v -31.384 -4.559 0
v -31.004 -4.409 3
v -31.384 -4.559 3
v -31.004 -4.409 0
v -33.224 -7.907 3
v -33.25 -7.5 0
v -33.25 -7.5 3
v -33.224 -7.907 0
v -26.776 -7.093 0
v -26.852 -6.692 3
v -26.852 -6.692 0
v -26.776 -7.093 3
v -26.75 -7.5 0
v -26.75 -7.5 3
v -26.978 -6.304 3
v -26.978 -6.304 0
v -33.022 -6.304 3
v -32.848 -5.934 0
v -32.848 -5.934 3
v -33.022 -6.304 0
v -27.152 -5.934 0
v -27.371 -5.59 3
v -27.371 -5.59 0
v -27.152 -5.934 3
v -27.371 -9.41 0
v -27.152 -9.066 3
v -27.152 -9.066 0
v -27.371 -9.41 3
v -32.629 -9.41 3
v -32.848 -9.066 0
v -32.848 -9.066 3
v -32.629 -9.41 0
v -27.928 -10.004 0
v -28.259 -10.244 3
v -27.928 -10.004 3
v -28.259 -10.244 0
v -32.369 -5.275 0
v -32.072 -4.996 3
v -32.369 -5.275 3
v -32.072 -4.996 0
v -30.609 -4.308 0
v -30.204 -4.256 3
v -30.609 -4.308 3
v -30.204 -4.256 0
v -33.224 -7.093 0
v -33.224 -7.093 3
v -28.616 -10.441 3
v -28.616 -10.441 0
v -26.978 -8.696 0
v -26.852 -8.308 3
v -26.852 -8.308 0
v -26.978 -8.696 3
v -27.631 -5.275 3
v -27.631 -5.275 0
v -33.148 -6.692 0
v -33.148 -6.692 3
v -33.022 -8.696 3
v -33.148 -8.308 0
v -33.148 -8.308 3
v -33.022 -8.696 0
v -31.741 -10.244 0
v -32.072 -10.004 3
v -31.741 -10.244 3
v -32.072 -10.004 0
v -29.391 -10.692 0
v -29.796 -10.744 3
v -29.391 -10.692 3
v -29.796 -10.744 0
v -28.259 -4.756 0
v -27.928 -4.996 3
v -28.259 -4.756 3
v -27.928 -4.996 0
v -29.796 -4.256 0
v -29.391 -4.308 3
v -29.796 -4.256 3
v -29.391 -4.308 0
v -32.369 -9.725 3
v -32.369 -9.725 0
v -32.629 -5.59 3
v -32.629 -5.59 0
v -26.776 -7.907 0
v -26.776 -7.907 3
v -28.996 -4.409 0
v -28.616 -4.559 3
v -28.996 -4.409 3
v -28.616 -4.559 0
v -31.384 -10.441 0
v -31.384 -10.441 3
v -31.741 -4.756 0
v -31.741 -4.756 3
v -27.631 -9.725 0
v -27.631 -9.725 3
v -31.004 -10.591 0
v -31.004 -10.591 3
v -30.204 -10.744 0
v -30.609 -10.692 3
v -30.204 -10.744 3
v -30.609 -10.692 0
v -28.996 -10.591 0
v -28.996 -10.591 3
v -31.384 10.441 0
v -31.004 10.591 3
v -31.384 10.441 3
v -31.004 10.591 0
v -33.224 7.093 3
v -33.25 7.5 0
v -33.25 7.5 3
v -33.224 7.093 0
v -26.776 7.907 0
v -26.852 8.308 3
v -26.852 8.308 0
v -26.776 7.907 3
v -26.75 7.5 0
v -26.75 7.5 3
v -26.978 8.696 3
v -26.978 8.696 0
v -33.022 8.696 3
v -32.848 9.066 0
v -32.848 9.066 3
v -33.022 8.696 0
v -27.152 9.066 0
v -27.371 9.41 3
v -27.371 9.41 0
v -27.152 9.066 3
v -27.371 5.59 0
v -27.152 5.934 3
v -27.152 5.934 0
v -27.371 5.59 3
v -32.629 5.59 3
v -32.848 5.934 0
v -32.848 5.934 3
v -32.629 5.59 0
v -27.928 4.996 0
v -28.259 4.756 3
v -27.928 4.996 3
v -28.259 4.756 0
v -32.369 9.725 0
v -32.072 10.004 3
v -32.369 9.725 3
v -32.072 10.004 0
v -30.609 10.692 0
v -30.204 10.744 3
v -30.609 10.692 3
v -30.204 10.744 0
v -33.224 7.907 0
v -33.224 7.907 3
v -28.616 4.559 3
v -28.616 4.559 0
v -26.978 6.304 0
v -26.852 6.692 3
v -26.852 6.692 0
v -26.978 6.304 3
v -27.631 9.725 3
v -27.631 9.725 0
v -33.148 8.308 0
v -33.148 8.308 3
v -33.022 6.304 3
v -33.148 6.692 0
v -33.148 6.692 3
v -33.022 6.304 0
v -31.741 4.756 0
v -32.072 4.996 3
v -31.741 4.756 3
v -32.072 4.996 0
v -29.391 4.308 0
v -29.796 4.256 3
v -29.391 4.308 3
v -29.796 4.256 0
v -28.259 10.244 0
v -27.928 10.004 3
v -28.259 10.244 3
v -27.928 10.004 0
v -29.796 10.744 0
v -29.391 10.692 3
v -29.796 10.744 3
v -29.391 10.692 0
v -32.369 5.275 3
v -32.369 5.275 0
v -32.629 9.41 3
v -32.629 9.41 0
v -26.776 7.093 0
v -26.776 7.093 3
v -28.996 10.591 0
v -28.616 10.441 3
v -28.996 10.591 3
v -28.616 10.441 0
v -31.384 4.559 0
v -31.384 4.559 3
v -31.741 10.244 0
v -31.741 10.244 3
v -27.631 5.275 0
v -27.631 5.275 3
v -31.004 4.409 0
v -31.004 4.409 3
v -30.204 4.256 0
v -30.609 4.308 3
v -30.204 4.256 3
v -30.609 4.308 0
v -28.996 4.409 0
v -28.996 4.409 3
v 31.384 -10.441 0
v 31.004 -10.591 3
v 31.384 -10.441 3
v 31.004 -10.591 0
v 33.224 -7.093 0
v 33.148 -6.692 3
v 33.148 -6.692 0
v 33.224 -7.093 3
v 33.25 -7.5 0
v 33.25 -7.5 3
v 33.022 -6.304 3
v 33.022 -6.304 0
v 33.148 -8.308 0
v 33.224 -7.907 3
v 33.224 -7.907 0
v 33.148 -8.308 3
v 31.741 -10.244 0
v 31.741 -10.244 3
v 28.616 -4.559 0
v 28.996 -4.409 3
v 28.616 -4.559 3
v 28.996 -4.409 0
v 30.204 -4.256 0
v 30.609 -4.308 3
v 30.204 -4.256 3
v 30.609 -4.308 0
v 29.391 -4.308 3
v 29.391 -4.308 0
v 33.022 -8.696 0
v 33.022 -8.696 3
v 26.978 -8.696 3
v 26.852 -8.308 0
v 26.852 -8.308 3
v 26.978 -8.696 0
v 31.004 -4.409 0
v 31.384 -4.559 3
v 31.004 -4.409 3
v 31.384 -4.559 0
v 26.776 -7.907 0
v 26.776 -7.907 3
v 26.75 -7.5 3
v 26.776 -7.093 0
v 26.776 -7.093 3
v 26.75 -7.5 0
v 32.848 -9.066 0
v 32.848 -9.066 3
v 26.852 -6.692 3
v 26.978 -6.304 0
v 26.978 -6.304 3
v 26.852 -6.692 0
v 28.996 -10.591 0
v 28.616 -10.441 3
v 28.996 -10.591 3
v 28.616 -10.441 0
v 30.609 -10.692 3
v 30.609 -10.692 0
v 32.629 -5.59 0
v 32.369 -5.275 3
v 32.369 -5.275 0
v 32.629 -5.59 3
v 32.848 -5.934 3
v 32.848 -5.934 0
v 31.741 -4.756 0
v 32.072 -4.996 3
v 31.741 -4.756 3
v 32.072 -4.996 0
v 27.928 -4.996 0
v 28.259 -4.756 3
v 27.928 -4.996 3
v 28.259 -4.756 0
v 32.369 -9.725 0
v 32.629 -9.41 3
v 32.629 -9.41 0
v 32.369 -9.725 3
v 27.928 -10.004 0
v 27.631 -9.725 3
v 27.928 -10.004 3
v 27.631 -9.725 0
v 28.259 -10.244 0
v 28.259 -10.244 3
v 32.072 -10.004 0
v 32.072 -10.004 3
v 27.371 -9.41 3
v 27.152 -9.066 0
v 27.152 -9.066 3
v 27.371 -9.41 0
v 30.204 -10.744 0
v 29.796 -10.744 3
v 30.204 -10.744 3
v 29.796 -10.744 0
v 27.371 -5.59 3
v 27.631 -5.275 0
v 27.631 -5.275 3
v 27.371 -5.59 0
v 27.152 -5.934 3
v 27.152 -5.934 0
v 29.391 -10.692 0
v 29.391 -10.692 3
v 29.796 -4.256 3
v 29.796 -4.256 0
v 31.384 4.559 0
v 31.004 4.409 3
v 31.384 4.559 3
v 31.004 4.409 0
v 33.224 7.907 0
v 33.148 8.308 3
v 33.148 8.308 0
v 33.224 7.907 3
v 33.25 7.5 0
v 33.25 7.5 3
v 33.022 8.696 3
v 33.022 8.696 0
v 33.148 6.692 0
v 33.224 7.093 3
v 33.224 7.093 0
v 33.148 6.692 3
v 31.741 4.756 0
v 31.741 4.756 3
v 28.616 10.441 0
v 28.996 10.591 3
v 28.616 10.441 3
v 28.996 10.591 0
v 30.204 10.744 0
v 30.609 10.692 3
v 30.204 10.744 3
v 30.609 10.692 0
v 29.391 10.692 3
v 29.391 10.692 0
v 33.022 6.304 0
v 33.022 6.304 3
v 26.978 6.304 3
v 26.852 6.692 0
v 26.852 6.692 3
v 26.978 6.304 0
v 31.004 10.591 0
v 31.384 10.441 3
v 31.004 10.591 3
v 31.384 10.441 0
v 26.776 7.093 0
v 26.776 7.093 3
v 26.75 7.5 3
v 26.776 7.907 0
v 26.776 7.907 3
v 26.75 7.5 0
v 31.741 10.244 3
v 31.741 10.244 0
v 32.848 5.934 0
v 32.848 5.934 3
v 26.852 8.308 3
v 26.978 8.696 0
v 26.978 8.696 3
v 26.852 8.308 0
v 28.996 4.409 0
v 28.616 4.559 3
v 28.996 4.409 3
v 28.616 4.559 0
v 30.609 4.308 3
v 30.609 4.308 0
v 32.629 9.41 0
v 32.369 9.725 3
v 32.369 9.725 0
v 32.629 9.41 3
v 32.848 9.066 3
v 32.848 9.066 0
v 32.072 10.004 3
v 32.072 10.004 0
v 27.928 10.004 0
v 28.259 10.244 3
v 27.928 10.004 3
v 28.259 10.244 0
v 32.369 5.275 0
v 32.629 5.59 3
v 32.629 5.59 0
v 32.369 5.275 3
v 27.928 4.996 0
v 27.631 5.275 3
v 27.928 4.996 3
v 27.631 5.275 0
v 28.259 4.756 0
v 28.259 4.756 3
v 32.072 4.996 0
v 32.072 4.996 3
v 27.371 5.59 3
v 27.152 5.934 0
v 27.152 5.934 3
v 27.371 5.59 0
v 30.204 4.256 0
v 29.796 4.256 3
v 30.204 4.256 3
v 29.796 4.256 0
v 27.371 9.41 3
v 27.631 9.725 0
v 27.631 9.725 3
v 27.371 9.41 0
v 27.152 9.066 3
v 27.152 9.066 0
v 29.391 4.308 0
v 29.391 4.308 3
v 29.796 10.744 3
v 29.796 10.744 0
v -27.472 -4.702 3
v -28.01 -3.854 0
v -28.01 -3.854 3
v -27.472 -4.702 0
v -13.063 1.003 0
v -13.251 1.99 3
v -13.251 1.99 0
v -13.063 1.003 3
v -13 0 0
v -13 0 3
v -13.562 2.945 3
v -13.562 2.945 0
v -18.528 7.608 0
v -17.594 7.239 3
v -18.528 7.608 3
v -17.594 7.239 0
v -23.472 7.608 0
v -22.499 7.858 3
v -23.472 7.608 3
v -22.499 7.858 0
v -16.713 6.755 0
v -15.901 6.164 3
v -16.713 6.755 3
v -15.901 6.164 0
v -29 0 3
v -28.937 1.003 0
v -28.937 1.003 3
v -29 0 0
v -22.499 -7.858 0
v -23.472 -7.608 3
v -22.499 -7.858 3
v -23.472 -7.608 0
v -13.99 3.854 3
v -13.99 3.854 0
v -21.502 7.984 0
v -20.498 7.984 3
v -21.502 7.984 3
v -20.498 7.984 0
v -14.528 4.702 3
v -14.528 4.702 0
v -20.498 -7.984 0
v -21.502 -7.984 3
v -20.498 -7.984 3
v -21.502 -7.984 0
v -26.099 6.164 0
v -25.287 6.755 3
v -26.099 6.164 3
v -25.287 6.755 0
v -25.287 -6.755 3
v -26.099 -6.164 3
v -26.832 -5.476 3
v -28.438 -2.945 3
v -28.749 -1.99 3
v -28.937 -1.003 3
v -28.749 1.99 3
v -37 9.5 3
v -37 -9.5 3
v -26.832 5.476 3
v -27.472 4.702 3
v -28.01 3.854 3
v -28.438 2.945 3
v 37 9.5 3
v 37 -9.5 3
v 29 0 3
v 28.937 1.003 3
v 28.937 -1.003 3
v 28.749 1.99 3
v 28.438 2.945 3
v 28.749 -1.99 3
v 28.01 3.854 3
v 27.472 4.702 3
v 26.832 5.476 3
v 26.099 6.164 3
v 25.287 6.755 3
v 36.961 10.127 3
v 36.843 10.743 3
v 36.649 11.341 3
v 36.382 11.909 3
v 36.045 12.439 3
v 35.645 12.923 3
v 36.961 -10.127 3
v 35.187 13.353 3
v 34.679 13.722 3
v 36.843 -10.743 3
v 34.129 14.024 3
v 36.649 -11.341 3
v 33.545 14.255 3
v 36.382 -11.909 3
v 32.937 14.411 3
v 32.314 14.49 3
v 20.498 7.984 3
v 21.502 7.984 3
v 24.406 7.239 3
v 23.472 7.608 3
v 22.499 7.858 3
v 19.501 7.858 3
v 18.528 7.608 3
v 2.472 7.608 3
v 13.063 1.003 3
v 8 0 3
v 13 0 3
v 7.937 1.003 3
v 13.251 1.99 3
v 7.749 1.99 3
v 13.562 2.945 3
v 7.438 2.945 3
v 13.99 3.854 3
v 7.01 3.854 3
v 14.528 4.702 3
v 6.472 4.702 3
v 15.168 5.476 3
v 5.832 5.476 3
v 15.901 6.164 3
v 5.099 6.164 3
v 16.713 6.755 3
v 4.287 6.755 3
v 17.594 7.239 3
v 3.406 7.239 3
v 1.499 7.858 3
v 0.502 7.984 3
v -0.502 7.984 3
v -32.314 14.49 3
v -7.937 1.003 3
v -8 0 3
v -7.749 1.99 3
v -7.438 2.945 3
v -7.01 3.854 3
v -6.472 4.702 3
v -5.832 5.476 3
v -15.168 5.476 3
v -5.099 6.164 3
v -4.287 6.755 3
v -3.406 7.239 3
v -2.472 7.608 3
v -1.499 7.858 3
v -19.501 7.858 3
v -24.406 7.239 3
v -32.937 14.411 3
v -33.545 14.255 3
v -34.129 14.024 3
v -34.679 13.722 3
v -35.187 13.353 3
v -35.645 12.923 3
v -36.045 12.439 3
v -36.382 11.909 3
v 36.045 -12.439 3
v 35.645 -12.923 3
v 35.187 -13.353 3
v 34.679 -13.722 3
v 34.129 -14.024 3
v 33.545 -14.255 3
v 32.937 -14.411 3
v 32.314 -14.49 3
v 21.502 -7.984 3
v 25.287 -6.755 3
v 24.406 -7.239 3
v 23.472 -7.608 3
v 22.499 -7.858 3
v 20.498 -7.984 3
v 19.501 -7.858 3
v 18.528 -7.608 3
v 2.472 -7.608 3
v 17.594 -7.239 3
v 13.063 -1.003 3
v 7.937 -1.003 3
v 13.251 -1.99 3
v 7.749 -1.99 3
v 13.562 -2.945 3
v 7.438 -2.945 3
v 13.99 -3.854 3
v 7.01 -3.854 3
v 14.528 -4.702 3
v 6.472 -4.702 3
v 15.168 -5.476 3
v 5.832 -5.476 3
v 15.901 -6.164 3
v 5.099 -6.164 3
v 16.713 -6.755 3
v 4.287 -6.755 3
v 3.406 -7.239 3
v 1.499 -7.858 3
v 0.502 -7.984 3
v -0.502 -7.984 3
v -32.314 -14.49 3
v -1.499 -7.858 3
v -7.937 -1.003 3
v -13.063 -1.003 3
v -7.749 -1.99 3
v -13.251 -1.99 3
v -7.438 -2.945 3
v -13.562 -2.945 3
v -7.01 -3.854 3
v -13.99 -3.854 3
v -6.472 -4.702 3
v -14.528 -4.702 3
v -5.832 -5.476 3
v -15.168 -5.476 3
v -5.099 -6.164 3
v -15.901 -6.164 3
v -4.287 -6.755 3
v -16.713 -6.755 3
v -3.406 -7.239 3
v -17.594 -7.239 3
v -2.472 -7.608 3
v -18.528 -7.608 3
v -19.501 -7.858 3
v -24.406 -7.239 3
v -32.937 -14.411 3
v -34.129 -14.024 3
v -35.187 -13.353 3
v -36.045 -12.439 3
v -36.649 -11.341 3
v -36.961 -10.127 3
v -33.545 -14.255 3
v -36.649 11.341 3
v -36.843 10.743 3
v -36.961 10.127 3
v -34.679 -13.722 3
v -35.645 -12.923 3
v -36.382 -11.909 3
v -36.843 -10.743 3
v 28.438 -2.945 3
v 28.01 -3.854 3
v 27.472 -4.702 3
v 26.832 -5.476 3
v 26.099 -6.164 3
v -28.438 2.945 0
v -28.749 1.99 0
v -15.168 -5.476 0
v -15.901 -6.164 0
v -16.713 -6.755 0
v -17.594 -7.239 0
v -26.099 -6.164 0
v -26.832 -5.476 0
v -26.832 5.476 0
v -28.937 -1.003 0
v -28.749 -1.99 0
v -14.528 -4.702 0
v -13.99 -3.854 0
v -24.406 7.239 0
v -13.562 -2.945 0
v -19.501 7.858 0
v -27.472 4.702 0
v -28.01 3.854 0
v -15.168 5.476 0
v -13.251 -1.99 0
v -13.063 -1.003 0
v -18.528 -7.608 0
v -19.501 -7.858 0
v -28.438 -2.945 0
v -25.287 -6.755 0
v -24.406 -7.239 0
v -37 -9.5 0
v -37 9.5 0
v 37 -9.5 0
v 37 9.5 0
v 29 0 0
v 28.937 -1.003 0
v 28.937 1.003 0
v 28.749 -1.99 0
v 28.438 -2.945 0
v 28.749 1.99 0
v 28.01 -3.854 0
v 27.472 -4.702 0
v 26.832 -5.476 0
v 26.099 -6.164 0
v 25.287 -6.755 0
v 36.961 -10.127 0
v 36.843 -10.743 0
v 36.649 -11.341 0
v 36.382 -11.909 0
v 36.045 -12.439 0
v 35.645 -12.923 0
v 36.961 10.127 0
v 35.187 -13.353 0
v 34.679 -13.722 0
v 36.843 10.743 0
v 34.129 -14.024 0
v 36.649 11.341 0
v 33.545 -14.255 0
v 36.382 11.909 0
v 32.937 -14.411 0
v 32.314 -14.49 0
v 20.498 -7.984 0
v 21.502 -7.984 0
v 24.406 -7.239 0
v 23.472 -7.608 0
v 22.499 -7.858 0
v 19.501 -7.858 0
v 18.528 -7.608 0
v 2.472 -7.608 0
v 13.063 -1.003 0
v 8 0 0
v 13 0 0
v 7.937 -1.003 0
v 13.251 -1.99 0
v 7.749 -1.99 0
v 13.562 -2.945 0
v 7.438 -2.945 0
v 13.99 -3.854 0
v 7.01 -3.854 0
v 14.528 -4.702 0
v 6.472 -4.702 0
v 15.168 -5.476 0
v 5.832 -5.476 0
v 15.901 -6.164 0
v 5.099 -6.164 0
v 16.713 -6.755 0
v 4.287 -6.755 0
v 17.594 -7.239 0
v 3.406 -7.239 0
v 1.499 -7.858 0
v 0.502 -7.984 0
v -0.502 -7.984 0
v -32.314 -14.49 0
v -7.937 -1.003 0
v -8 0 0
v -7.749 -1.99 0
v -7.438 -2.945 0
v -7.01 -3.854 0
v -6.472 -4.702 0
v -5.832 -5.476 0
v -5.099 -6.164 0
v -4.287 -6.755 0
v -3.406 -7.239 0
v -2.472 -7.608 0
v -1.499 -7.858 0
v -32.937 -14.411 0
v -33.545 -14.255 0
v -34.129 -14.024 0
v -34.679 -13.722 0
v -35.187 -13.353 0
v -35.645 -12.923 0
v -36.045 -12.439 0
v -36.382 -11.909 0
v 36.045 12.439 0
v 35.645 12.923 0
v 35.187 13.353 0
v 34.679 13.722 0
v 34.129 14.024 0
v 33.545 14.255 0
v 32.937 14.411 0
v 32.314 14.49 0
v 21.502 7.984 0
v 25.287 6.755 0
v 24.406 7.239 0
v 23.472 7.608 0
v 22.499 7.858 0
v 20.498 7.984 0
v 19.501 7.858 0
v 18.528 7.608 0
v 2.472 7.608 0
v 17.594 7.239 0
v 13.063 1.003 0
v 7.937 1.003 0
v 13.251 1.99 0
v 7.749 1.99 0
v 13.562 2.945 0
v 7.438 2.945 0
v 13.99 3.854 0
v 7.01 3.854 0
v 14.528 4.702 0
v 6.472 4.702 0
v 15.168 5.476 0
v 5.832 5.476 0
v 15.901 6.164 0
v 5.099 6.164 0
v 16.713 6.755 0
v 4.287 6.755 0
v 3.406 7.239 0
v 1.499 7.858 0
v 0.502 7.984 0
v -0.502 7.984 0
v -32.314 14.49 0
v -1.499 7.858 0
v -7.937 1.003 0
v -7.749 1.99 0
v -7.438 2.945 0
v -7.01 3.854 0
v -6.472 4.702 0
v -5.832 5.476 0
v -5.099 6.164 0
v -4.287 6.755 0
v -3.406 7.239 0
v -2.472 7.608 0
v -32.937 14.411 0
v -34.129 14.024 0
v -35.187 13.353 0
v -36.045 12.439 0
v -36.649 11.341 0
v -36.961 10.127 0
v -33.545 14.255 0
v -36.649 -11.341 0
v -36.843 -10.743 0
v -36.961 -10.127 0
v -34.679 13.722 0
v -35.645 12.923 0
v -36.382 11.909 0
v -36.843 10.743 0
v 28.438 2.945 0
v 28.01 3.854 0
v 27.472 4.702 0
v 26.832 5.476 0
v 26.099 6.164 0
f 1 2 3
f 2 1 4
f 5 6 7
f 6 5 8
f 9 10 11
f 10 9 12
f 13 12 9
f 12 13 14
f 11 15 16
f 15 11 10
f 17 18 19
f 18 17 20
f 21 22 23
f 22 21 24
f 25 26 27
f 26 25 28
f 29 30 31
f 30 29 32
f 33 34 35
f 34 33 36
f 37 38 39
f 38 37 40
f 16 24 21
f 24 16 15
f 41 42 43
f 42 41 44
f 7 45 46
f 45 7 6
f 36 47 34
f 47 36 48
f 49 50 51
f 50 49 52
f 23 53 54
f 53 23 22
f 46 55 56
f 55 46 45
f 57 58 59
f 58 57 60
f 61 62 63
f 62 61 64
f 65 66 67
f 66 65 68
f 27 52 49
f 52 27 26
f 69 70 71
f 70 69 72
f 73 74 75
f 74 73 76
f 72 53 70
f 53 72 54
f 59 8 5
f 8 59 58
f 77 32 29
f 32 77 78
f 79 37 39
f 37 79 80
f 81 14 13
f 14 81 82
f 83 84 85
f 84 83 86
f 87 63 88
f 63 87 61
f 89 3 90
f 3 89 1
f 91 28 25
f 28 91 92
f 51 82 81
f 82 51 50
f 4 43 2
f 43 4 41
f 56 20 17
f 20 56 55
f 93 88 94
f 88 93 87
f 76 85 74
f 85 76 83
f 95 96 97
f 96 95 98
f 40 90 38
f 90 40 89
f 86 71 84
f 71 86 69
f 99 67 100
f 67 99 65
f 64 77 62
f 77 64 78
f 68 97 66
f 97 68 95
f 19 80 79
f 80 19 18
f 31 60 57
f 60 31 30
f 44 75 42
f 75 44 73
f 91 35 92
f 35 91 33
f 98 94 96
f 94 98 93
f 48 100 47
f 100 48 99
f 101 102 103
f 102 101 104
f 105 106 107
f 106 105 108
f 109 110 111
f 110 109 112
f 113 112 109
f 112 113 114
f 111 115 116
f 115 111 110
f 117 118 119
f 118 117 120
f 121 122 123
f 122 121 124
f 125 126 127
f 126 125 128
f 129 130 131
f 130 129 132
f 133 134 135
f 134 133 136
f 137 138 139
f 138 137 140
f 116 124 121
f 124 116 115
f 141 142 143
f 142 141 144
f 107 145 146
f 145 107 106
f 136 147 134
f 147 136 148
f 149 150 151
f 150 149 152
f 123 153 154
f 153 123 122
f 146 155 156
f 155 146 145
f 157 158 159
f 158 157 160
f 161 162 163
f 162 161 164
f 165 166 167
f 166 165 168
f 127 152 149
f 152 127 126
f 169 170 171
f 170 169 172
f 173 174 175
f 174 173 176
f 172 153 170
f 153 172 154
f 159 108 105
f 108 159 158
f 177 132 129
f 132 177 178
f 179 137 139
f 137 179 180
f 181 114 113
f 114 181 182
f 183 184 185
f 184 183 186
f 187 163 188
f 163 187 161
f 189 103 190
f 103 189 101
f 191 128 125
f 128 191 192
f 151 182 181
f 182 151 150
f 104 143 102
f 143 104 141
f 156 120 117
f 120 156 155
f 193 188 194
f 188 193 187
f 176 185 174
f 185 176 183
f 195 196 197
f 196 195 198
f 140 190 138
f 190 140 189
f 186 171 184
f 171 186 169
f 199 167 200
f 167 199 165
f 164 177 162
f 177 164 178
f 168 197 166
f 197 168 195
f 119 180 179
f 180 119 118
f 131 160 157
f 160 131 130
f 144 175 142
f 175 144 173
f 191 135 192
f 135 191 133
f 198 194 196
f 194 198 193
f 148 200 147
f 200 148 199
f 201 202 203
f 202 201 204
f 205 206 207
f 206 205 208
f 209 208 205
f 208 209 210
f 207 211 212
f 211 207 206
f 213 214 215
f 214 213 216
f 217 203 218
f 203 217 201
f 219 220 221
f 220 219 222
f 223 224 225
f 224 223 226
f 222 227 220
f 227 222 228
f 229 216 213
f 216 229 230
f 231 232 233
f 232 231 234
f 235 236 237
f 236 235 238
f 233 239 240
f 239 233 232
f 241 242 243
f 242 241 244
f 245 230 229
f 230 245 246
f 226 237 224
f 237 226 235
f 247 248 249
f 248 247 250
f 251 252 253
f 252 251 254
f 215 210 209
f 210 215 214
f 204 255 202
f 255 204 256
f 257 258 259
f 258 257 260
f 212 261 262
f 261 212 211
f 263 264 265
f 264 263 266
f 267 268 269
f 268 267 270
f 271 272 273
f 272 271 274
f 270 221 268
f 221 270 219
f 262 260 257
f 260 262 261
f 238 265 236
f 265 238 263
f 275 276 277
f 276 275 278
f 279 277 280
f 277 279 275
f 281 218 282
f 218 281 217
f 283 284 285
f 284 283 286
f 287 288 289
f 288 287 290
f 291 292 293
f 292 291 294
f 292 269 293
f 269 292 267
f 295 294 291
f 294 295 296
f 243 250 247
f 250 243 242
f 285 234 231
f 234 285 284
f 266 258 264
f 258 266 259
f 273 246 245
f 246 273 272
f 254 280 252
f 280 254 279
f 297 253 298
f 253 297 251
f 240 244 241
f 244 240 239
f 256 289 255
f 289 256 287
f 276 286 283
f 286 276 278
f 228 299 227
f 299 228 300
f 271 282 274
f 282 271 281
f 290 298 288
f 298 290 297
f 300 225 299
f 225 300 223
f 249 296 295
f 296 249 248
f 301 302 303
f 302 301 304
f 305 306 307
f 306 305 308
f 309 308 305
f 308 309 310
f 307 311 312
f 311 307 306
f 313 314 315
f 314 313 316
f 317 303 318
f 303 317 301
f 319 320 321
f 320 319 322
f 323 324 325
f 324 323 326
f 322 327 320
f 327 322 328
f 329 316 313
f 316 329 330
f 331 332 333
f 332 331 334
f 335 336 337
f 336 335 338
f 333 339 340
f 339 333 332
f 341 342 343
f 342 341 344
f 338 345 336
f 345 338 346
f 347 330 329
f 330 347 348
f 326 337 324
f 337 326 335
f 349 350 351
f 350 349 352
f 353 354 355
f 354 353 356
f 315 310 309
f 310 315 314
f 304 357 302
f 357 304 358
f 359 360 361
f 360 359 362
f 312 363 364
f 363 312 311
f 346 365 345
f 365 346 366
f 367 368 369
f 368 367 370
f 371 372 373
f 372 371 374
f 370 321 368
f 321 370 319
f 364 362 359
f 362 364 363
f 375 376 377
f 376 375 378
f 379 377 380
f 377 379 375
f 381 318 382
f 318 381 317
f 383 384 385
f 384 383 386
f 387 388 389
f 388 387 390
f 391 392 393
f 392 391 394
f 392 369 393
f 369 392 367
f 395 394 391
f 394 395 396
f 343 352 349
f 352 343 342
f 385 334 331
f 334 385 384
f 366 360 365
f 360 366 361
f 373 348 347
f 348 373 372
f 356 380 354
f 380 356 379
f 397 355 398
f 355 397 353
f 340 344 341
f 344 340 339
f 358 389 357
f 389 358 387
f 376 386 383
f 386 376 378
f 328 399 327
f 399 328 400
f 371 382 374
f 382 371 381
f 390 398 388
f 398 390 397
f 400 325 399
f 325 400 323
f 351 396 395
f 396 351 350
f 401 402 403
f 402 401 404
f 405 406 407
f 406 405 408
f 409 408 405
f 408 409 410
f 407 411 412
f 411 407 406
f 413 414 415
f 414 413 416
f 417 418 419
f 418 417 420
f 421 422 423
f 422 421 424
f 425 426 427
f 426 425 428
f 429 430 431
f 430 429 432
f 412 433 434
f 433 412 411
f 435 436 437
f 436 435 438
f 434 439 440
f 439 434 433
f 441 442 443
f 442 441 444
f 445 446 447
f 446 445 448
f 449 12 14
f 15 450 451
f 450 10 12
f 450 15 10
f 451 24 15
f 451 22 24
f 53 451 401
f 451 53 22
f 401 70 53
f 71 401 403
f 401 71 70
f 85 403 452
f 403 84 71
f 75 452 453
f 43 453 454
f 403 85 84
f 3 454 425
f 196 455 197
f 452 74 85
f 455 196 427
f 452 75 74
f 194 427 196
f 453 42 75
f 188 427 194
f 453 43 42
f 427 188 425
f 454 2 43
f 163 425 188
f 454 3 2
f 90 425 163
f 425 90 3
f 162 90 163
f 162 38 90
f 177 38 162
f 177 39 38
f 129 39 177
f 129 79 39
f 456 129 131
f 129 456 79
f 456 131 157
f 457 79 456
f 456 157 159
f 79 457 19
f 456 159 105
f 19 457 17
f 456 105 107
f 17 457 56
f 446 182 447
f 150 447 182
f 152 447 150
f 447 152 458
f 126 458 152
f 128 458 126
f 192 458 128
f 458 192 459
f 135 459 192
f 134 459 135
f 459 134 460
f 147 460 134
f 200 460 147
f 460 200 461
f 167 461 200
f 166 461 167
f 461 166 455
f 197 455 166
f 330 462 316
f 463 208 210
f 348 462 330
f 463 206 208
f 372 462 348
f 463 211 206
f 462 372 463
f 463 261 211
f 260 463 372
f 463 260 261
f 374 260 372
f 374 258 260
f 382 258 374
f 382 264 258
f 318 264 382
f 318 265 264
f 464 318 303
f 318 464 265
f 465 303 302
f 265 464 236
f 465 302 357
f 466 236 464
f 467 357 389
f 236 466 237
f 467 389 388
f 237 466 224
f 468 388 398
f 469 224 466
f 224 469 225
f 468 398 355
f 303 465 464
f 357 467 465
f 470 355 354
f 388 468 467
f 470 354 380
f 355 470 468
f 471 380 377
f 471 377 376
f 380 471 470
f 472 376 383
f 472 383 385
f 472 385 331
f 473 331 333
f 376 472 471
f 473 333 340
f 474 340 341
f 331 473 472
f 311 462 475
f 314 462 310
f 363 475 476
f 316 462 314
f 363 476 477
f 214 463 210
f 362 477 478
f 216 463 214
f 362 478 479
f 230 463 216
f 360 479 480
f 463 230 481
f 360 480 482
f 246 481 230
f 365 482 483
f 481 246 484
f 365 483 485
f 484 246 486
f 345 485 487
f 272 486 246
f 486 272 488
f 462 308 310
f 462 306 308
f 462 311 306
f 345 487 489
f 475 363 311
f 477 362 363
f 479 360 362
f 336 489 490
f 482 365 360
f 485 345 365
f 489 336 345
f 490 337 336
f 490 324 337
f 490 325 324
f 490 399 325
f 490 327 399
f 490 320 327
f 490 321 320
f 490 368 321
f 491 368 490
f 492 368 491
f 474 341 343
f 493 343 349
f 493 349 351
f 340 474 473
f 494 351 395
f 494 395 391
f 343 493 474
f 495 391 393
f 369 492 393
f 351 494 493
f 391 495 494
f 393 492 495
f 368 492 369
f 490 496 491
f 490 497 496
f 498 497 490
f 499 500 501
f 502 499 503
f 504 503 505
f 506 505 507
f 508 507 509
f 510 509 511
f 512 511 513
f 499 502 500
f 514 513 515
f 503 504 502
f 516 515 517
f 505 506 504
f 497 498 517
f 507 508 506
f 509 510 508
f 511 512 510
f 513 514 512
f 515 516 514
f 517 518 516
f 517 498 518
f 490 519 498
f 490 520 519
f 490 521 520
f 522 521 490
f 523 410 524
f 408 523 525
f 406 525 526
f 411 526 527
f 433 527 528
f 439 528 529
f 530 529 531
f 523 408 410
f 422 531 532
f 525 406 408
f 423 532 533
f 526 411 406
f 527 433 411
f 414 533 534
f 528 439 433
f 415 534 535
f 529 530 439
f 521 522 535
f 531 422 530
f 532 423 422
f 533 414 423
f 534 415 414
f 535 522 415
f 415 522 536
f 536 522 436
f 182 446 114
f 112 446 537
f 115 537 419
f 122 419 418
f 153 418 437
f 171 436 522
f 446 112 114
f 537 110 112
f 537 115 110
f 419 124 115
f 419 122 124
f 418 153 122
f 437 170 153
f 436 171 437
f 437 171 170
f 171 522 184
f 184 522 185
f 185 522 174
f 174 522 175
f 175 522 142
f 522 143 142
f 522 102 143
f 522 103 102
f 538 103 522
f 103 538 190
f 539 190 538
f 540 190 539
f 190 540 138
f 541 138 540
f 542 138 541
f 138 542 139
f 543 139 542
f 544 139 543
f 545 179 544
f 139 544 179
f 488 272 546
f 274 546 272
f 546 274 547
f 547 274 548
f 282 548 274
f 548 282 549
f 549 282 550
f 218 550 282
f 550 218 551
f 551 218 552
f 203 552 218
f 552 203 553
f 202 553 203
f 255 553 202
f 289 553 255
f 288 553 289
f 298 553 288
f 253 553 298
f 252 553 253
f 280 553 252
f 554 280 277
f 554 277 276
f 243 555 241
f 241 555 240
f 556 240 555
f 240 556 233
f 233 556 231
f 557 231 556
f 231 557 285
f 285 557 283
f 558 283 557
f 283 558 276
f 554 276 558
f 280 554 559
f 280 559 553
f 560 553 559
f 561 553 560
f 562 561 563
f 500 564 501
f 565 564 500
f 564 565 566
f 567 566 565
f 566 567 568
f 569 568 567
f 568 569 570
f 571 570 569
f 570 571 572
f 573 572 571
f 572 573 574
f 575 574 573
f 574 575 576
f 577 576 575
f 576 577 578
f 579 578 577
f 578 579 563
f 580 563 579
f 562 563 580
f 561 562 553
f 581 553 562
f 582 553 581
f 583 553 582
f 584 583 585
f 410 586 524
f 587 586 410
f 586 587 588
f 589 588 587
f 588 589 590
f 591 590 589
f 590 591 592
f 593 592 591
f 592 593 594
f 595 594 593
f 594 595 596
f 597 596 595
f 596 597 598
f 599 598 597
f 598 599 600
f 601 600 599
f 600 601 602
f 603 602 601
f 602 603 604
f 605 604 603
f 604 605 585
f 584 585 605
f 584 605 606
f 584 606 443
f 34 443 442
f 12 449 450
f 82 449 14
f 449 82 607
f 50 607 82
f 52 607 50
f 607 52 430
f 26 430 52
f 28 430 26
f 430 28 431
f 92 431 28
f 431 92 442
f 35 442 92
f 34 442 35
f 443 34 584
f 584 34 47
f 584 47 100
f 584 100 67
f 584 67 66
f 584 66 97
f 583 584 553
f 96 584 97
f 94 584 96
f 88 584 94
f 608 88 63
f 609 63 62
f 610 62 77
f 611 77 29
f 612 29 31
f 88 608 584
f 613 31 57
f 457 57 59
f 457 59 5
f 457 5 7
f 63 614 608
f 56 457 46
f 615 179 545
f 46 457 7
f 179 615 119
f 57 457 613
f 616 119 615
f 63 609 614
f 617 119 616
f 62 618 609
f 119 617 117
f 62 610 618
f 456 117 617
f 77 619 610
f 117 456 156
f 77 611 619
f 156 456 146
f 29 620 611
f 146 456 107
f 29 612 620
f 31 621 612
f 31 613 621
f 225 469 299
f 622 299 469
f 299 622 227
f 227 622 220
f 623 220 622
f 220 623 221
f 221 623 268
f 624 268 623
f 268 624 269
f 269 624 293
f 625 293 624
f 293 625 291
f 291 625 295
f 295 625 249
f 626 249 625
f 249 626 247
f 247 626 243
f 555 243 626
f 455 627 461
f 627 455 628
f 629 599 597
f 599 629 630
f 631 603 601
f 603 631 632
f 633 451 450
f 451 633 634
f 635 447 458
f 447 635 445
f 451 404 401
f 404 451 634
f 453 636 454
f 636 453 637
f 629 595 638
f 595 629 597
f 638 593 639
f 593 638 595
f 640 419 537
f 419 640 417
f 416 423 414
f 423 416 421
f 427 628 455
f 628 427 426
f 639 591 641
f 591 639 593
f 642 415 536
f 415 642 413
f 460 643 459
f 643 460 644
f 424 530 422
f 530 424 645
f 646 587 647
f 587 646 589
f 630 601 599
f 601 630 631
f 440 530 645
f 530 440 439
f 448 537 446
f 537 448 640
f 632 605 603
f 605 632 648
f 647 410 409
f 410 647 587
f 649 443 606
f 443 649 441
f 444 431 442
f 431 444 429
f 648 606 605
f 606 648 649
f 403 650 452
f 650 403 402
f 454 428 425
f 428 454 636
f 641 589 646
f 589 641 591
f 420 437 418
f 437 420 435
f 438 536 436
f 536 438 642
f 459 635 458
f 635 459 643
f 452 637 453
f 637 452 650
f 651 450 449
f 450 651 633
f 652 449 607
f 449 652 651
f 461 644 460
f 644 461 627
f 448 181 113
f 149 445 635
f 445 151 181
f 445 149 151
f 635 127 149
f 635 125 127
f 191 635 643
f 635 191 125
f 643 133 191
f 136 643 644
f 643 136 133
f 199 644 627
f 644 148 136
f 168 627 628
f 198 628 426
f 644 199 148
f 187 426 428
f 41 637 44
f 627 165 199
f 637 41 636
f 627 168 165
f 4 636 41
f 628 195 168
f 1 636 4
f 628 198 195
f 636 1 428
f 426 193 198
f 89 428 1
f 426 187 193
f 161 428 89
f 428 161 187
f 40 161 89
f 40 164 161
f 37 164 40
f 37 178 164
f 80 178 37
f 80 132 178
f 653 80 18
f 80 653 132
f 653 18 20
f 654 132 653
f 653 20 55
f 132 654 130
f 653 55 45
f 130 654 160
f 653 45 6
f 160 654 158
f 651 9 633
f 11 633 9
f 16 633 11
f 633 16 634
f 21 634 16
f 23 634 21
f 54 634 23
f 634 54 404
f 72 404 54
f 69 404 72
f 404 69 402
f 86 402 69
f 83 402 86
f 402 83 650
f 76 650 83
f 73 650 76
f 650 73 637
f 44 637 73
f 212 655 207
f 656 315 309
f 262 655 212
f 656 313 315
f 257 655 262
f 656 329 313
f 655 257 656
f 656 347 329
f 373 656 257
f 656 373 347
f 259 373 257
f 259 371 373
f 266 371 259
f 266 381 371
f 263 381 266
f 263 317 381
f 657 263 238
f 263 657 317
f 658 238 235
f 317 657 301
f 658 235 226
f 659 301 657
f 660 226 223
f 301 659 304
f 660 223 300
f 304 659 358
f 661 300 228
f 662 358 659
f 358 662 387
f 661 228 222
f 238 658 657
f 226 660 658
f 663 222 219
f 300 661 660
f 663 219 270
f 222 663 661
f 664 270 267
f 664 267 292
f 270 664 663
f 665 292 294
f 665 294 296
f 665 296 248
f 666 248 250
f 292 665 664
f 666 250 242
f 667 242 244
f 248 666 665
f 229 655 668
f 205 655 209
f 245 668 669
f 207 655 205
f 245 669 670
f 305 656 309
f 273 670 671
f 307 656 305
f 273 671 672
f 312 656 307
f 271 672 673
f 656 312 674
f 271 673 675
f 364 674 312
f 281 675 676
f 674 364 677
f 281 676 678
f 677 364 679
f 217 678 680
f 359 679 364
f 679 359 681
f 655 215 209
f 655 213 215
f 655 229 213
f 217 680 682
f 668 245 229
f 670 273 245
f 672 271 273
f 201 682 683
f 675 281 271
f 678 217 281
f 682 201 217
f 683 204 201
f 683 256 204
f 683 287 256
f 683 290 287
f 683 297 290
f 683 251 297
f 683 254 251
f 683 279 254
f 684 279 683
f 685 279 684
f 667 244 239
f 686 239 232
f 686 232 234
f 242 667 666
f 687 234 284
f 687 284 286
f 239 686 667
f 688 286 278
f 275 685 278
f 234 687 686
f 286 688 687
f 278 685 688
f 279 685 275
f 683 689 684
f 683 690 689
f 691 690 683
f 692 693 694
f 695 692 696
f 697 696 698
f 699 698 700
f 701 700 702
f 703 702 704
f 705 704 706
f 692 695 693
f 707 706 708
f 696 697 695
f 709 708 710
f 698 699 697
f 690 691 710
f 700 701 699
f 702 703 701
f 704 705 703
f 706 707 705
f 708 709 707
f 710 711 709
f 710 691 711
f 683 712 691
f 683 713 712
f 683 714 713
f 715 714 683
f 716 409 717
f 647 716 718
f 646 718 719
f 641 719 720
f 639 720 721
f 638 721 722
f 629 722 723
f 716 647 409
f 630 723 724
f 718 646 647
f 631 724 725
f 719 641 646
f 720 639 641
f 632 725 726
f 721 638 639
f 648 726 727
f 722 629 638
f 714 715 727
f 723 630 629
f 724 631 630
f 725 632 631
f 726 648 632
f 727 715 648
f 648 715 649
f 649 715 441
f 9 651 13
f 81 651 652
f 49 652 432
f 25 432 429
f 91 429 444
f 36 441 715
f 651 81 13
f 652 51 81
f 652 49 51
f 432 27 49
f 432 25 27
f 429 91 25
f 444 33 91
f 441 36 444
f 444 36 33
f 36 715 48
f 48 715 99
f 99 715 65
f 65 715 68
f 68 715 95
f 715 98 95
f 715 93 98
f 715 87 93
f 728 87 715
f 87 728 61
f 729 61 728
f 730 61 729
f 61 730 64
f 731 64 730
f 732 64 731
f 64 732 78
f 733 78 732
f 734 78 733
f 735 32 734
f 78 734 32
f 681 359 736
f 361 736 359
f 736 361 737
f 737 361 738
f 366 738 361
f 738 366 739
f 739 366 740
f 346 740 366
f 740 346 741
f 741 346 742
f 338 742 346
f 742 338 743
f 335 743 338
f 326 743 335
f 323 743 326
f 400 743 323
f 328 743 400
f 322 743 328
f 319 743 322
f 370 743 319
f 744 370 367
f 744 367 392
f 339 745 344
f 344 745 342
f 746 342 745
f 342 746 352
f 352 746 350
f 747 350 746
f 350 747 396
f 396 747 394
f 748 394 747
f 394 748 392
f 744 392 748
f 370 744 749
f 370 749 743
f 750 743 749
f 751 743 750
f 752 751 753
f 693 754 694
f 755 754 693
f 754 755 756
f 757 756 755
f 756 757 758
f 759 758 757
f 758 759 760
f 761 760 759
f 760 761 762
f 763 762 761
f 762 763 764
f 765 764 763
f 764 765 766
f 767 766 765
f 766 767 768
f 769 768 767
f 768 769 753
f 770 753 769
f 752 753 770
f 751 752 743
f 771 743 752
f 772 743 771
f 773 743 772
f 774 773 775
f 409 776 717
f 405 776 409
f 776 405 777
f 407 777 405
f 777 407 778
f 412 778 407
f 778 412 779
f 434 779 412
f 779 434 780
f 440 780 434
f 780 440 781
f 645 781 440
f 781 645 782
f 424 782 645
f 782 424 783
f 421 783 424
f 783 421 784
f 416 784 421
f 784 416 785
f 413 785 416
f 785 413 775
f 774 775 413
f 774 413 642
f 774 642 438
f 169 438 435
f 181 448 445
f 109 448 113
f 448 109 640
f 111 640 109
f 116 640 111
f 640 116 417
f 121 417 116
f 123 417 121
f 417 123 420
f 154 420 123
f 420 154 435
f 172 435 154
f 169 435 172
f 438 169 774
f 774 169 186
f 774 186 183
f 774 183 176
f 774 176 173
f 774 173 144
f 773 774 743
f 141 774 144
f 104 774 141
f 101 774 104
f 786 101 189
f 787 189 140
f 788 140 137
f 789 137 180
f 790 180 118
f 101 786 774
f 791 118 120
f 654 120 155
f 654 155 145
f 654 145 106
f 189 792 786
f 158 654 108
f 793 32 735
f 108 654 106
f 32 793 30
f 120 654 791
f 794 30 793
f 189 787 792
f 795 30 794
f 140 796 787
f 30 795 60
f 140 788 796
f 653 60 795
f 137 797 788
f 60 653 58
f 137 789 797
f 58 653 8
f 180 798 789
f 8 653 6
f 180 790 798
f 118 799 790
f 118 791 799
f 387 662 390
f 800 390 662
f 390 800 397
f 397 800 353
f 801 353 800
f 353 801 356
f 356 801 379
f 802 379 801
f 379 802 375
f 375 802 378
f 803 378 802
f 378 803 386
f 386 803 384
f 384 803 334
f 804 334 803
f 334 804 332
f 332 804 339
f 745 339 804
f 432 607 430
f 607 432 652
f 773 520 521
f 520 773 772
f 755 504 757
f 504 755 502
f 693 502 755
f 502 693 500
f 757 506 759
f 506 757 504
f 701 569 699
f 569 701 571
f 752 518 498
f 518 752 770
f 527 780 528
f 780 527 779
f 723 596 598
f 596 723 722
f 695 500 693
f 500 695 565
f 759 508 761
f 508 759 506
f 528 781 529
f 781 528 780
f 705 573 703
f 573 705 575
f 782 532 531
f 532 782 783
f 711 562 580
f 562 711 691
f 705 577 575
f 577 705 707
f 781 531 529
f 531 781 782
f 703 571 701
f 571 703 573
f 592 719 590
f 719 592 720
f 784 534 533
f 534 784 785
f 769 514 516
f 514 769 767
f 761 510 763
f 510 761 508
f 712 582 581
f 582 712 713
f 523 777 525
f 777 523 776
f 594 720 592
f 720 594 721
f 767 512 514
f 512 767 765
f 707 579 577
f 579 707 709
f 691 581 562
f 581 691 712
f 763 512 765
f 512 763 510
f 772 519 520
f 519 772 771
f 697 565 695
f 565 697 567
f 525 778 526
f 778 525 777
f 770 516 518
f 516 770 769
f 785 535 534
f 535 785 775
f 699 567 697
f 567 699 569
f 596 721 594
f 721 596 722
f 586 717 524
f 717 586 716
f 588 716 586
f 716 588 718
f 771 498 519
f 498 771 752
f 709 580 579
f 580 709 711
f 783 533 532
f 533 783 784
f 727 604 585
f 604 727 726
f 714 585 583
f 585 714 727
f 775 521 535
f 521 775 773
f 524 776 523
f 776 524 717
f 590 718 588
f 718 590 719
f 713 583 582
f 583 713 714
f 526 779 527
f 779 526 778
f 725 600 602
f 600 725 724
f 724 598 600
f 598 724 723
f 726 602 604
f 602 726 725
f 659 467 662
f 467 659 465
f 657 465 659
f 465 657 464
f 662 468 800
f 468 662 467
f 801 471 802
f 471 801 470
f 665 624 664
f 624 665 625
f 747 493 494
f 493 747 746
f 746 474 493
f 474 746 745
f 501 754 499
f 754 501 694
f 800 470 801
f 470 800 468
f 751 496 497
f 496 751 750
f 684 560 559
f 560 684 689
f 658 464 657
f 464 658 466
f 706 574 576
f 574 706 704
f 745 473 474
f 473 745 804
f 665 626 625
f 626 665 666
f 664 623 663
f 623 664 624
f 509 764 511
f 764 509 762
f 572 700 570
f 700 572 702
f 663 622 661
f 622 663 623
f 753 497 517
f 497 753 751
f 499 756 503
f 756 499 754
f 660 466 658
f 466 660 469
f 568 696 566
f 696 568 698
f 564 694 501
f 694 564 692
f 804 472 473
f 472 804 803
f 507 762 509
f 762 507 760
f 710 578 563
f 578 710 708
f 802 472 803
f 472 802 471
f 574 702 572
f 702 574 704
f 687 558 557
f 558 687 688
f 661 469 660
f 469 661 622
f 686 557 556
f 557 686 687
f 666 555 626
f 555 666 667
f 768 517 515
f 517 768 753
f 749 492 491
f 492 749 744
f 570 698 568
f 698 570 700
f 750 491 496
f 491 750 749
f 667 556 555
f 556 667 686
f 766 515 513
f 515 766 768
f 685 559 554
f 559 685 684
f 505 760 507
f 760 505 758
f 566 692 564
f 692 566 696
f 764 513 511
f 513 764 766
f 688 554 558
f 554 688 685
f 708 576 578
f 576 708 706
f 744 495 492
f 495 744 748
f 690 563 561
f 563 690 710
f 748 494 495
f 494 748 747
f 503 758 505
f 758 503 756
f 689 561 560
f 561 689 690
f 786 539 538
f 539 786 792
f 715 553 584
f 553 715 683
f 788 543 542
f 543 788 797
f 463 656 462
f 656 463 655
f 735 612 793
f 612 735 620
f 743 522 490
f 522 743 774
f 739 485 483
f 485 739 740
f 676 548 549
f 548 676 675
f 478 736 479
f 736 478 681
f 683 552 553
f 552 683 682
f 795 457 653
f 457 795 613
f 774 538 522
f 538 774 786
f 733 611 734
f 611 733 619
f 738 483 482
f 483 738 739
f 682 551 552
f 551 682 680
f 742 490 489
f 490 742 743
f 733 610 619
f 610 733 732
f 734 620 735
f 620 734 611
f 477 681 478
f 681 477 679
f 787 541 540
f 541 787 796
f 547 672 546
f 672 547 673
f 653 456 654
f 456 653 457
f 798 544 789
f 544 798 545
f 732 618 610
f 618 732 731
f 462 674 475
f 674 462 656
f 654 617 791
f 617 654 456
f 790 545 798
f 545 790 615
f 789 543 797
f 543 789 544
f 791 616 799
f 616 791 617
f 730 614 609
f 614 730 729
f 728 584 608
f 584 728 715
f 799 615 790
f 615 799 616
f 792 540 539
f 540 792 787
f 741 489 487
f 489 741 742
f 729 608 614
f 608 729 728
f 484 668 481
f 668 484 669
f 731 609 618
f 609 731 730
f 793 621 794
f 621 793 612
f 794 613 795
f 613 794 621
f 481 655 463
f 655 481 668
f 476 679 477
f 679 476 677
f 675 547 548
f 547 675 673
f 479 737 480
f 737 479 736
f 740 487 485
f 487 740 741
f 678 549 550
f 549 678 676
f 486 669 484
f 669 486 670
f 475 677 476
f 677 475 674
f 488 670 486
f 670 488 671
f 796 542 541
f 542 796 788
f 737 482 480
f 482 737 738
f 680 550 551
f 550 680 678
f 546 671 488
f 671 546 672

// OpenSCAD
$fn = 50;


difference() {
	union() {
		hull() {
			translate(v = [-32.0000000000, 9.5000000000, 0]) {
				cylinder(h = 3, r = 5);
			}
			translate(v = [32.0000000000, 9.5000000000, 0]) {
				cylinder(h = 3, r = 5);
			}
			translate(v = [-32.0000000000, -9.5000000000, 0]) {
				cylinder(h = 3, r = 5);
			}
			translate(v = [32.0000000000, -9.5000000000, 0]) {
				cylinder(h = 3, r = 5);
			}
		}
	}
	union() {
		#translate(v = [-30.0000000000, -7.5000000000, -100.0000000000]) {
			cylinder(h = 200, r = 3.2500000000);
		}
		#translate(v = [-30.0000000000, 7.5000000000, -100.0000000000]) {
			cylinder(h = 200, r = 3.2500000000);
		}
		#translate(v = [30.0000000000, -7.5000000000, -100.0000000000]) {
			cylinder(h = 200, r = 3.2500000000);
		}
		#translate(v = [30.0000000000, 7.5000000000, -100.0000000000]) {
			cylinder(h = 200, r = 3.2500000000);
		}
		#translate(v = [-21.0000000000, 0, 0]) {
			cylinder(h = 3, r = 8.0000000000);
		}
		#cylinder(h = 3, r = 8.0000000000);
		#translate(v = [21.0000000000, 0, 0]) {
			cylinder(h = 3, r = 8.0000000000);
		}
	}
}
